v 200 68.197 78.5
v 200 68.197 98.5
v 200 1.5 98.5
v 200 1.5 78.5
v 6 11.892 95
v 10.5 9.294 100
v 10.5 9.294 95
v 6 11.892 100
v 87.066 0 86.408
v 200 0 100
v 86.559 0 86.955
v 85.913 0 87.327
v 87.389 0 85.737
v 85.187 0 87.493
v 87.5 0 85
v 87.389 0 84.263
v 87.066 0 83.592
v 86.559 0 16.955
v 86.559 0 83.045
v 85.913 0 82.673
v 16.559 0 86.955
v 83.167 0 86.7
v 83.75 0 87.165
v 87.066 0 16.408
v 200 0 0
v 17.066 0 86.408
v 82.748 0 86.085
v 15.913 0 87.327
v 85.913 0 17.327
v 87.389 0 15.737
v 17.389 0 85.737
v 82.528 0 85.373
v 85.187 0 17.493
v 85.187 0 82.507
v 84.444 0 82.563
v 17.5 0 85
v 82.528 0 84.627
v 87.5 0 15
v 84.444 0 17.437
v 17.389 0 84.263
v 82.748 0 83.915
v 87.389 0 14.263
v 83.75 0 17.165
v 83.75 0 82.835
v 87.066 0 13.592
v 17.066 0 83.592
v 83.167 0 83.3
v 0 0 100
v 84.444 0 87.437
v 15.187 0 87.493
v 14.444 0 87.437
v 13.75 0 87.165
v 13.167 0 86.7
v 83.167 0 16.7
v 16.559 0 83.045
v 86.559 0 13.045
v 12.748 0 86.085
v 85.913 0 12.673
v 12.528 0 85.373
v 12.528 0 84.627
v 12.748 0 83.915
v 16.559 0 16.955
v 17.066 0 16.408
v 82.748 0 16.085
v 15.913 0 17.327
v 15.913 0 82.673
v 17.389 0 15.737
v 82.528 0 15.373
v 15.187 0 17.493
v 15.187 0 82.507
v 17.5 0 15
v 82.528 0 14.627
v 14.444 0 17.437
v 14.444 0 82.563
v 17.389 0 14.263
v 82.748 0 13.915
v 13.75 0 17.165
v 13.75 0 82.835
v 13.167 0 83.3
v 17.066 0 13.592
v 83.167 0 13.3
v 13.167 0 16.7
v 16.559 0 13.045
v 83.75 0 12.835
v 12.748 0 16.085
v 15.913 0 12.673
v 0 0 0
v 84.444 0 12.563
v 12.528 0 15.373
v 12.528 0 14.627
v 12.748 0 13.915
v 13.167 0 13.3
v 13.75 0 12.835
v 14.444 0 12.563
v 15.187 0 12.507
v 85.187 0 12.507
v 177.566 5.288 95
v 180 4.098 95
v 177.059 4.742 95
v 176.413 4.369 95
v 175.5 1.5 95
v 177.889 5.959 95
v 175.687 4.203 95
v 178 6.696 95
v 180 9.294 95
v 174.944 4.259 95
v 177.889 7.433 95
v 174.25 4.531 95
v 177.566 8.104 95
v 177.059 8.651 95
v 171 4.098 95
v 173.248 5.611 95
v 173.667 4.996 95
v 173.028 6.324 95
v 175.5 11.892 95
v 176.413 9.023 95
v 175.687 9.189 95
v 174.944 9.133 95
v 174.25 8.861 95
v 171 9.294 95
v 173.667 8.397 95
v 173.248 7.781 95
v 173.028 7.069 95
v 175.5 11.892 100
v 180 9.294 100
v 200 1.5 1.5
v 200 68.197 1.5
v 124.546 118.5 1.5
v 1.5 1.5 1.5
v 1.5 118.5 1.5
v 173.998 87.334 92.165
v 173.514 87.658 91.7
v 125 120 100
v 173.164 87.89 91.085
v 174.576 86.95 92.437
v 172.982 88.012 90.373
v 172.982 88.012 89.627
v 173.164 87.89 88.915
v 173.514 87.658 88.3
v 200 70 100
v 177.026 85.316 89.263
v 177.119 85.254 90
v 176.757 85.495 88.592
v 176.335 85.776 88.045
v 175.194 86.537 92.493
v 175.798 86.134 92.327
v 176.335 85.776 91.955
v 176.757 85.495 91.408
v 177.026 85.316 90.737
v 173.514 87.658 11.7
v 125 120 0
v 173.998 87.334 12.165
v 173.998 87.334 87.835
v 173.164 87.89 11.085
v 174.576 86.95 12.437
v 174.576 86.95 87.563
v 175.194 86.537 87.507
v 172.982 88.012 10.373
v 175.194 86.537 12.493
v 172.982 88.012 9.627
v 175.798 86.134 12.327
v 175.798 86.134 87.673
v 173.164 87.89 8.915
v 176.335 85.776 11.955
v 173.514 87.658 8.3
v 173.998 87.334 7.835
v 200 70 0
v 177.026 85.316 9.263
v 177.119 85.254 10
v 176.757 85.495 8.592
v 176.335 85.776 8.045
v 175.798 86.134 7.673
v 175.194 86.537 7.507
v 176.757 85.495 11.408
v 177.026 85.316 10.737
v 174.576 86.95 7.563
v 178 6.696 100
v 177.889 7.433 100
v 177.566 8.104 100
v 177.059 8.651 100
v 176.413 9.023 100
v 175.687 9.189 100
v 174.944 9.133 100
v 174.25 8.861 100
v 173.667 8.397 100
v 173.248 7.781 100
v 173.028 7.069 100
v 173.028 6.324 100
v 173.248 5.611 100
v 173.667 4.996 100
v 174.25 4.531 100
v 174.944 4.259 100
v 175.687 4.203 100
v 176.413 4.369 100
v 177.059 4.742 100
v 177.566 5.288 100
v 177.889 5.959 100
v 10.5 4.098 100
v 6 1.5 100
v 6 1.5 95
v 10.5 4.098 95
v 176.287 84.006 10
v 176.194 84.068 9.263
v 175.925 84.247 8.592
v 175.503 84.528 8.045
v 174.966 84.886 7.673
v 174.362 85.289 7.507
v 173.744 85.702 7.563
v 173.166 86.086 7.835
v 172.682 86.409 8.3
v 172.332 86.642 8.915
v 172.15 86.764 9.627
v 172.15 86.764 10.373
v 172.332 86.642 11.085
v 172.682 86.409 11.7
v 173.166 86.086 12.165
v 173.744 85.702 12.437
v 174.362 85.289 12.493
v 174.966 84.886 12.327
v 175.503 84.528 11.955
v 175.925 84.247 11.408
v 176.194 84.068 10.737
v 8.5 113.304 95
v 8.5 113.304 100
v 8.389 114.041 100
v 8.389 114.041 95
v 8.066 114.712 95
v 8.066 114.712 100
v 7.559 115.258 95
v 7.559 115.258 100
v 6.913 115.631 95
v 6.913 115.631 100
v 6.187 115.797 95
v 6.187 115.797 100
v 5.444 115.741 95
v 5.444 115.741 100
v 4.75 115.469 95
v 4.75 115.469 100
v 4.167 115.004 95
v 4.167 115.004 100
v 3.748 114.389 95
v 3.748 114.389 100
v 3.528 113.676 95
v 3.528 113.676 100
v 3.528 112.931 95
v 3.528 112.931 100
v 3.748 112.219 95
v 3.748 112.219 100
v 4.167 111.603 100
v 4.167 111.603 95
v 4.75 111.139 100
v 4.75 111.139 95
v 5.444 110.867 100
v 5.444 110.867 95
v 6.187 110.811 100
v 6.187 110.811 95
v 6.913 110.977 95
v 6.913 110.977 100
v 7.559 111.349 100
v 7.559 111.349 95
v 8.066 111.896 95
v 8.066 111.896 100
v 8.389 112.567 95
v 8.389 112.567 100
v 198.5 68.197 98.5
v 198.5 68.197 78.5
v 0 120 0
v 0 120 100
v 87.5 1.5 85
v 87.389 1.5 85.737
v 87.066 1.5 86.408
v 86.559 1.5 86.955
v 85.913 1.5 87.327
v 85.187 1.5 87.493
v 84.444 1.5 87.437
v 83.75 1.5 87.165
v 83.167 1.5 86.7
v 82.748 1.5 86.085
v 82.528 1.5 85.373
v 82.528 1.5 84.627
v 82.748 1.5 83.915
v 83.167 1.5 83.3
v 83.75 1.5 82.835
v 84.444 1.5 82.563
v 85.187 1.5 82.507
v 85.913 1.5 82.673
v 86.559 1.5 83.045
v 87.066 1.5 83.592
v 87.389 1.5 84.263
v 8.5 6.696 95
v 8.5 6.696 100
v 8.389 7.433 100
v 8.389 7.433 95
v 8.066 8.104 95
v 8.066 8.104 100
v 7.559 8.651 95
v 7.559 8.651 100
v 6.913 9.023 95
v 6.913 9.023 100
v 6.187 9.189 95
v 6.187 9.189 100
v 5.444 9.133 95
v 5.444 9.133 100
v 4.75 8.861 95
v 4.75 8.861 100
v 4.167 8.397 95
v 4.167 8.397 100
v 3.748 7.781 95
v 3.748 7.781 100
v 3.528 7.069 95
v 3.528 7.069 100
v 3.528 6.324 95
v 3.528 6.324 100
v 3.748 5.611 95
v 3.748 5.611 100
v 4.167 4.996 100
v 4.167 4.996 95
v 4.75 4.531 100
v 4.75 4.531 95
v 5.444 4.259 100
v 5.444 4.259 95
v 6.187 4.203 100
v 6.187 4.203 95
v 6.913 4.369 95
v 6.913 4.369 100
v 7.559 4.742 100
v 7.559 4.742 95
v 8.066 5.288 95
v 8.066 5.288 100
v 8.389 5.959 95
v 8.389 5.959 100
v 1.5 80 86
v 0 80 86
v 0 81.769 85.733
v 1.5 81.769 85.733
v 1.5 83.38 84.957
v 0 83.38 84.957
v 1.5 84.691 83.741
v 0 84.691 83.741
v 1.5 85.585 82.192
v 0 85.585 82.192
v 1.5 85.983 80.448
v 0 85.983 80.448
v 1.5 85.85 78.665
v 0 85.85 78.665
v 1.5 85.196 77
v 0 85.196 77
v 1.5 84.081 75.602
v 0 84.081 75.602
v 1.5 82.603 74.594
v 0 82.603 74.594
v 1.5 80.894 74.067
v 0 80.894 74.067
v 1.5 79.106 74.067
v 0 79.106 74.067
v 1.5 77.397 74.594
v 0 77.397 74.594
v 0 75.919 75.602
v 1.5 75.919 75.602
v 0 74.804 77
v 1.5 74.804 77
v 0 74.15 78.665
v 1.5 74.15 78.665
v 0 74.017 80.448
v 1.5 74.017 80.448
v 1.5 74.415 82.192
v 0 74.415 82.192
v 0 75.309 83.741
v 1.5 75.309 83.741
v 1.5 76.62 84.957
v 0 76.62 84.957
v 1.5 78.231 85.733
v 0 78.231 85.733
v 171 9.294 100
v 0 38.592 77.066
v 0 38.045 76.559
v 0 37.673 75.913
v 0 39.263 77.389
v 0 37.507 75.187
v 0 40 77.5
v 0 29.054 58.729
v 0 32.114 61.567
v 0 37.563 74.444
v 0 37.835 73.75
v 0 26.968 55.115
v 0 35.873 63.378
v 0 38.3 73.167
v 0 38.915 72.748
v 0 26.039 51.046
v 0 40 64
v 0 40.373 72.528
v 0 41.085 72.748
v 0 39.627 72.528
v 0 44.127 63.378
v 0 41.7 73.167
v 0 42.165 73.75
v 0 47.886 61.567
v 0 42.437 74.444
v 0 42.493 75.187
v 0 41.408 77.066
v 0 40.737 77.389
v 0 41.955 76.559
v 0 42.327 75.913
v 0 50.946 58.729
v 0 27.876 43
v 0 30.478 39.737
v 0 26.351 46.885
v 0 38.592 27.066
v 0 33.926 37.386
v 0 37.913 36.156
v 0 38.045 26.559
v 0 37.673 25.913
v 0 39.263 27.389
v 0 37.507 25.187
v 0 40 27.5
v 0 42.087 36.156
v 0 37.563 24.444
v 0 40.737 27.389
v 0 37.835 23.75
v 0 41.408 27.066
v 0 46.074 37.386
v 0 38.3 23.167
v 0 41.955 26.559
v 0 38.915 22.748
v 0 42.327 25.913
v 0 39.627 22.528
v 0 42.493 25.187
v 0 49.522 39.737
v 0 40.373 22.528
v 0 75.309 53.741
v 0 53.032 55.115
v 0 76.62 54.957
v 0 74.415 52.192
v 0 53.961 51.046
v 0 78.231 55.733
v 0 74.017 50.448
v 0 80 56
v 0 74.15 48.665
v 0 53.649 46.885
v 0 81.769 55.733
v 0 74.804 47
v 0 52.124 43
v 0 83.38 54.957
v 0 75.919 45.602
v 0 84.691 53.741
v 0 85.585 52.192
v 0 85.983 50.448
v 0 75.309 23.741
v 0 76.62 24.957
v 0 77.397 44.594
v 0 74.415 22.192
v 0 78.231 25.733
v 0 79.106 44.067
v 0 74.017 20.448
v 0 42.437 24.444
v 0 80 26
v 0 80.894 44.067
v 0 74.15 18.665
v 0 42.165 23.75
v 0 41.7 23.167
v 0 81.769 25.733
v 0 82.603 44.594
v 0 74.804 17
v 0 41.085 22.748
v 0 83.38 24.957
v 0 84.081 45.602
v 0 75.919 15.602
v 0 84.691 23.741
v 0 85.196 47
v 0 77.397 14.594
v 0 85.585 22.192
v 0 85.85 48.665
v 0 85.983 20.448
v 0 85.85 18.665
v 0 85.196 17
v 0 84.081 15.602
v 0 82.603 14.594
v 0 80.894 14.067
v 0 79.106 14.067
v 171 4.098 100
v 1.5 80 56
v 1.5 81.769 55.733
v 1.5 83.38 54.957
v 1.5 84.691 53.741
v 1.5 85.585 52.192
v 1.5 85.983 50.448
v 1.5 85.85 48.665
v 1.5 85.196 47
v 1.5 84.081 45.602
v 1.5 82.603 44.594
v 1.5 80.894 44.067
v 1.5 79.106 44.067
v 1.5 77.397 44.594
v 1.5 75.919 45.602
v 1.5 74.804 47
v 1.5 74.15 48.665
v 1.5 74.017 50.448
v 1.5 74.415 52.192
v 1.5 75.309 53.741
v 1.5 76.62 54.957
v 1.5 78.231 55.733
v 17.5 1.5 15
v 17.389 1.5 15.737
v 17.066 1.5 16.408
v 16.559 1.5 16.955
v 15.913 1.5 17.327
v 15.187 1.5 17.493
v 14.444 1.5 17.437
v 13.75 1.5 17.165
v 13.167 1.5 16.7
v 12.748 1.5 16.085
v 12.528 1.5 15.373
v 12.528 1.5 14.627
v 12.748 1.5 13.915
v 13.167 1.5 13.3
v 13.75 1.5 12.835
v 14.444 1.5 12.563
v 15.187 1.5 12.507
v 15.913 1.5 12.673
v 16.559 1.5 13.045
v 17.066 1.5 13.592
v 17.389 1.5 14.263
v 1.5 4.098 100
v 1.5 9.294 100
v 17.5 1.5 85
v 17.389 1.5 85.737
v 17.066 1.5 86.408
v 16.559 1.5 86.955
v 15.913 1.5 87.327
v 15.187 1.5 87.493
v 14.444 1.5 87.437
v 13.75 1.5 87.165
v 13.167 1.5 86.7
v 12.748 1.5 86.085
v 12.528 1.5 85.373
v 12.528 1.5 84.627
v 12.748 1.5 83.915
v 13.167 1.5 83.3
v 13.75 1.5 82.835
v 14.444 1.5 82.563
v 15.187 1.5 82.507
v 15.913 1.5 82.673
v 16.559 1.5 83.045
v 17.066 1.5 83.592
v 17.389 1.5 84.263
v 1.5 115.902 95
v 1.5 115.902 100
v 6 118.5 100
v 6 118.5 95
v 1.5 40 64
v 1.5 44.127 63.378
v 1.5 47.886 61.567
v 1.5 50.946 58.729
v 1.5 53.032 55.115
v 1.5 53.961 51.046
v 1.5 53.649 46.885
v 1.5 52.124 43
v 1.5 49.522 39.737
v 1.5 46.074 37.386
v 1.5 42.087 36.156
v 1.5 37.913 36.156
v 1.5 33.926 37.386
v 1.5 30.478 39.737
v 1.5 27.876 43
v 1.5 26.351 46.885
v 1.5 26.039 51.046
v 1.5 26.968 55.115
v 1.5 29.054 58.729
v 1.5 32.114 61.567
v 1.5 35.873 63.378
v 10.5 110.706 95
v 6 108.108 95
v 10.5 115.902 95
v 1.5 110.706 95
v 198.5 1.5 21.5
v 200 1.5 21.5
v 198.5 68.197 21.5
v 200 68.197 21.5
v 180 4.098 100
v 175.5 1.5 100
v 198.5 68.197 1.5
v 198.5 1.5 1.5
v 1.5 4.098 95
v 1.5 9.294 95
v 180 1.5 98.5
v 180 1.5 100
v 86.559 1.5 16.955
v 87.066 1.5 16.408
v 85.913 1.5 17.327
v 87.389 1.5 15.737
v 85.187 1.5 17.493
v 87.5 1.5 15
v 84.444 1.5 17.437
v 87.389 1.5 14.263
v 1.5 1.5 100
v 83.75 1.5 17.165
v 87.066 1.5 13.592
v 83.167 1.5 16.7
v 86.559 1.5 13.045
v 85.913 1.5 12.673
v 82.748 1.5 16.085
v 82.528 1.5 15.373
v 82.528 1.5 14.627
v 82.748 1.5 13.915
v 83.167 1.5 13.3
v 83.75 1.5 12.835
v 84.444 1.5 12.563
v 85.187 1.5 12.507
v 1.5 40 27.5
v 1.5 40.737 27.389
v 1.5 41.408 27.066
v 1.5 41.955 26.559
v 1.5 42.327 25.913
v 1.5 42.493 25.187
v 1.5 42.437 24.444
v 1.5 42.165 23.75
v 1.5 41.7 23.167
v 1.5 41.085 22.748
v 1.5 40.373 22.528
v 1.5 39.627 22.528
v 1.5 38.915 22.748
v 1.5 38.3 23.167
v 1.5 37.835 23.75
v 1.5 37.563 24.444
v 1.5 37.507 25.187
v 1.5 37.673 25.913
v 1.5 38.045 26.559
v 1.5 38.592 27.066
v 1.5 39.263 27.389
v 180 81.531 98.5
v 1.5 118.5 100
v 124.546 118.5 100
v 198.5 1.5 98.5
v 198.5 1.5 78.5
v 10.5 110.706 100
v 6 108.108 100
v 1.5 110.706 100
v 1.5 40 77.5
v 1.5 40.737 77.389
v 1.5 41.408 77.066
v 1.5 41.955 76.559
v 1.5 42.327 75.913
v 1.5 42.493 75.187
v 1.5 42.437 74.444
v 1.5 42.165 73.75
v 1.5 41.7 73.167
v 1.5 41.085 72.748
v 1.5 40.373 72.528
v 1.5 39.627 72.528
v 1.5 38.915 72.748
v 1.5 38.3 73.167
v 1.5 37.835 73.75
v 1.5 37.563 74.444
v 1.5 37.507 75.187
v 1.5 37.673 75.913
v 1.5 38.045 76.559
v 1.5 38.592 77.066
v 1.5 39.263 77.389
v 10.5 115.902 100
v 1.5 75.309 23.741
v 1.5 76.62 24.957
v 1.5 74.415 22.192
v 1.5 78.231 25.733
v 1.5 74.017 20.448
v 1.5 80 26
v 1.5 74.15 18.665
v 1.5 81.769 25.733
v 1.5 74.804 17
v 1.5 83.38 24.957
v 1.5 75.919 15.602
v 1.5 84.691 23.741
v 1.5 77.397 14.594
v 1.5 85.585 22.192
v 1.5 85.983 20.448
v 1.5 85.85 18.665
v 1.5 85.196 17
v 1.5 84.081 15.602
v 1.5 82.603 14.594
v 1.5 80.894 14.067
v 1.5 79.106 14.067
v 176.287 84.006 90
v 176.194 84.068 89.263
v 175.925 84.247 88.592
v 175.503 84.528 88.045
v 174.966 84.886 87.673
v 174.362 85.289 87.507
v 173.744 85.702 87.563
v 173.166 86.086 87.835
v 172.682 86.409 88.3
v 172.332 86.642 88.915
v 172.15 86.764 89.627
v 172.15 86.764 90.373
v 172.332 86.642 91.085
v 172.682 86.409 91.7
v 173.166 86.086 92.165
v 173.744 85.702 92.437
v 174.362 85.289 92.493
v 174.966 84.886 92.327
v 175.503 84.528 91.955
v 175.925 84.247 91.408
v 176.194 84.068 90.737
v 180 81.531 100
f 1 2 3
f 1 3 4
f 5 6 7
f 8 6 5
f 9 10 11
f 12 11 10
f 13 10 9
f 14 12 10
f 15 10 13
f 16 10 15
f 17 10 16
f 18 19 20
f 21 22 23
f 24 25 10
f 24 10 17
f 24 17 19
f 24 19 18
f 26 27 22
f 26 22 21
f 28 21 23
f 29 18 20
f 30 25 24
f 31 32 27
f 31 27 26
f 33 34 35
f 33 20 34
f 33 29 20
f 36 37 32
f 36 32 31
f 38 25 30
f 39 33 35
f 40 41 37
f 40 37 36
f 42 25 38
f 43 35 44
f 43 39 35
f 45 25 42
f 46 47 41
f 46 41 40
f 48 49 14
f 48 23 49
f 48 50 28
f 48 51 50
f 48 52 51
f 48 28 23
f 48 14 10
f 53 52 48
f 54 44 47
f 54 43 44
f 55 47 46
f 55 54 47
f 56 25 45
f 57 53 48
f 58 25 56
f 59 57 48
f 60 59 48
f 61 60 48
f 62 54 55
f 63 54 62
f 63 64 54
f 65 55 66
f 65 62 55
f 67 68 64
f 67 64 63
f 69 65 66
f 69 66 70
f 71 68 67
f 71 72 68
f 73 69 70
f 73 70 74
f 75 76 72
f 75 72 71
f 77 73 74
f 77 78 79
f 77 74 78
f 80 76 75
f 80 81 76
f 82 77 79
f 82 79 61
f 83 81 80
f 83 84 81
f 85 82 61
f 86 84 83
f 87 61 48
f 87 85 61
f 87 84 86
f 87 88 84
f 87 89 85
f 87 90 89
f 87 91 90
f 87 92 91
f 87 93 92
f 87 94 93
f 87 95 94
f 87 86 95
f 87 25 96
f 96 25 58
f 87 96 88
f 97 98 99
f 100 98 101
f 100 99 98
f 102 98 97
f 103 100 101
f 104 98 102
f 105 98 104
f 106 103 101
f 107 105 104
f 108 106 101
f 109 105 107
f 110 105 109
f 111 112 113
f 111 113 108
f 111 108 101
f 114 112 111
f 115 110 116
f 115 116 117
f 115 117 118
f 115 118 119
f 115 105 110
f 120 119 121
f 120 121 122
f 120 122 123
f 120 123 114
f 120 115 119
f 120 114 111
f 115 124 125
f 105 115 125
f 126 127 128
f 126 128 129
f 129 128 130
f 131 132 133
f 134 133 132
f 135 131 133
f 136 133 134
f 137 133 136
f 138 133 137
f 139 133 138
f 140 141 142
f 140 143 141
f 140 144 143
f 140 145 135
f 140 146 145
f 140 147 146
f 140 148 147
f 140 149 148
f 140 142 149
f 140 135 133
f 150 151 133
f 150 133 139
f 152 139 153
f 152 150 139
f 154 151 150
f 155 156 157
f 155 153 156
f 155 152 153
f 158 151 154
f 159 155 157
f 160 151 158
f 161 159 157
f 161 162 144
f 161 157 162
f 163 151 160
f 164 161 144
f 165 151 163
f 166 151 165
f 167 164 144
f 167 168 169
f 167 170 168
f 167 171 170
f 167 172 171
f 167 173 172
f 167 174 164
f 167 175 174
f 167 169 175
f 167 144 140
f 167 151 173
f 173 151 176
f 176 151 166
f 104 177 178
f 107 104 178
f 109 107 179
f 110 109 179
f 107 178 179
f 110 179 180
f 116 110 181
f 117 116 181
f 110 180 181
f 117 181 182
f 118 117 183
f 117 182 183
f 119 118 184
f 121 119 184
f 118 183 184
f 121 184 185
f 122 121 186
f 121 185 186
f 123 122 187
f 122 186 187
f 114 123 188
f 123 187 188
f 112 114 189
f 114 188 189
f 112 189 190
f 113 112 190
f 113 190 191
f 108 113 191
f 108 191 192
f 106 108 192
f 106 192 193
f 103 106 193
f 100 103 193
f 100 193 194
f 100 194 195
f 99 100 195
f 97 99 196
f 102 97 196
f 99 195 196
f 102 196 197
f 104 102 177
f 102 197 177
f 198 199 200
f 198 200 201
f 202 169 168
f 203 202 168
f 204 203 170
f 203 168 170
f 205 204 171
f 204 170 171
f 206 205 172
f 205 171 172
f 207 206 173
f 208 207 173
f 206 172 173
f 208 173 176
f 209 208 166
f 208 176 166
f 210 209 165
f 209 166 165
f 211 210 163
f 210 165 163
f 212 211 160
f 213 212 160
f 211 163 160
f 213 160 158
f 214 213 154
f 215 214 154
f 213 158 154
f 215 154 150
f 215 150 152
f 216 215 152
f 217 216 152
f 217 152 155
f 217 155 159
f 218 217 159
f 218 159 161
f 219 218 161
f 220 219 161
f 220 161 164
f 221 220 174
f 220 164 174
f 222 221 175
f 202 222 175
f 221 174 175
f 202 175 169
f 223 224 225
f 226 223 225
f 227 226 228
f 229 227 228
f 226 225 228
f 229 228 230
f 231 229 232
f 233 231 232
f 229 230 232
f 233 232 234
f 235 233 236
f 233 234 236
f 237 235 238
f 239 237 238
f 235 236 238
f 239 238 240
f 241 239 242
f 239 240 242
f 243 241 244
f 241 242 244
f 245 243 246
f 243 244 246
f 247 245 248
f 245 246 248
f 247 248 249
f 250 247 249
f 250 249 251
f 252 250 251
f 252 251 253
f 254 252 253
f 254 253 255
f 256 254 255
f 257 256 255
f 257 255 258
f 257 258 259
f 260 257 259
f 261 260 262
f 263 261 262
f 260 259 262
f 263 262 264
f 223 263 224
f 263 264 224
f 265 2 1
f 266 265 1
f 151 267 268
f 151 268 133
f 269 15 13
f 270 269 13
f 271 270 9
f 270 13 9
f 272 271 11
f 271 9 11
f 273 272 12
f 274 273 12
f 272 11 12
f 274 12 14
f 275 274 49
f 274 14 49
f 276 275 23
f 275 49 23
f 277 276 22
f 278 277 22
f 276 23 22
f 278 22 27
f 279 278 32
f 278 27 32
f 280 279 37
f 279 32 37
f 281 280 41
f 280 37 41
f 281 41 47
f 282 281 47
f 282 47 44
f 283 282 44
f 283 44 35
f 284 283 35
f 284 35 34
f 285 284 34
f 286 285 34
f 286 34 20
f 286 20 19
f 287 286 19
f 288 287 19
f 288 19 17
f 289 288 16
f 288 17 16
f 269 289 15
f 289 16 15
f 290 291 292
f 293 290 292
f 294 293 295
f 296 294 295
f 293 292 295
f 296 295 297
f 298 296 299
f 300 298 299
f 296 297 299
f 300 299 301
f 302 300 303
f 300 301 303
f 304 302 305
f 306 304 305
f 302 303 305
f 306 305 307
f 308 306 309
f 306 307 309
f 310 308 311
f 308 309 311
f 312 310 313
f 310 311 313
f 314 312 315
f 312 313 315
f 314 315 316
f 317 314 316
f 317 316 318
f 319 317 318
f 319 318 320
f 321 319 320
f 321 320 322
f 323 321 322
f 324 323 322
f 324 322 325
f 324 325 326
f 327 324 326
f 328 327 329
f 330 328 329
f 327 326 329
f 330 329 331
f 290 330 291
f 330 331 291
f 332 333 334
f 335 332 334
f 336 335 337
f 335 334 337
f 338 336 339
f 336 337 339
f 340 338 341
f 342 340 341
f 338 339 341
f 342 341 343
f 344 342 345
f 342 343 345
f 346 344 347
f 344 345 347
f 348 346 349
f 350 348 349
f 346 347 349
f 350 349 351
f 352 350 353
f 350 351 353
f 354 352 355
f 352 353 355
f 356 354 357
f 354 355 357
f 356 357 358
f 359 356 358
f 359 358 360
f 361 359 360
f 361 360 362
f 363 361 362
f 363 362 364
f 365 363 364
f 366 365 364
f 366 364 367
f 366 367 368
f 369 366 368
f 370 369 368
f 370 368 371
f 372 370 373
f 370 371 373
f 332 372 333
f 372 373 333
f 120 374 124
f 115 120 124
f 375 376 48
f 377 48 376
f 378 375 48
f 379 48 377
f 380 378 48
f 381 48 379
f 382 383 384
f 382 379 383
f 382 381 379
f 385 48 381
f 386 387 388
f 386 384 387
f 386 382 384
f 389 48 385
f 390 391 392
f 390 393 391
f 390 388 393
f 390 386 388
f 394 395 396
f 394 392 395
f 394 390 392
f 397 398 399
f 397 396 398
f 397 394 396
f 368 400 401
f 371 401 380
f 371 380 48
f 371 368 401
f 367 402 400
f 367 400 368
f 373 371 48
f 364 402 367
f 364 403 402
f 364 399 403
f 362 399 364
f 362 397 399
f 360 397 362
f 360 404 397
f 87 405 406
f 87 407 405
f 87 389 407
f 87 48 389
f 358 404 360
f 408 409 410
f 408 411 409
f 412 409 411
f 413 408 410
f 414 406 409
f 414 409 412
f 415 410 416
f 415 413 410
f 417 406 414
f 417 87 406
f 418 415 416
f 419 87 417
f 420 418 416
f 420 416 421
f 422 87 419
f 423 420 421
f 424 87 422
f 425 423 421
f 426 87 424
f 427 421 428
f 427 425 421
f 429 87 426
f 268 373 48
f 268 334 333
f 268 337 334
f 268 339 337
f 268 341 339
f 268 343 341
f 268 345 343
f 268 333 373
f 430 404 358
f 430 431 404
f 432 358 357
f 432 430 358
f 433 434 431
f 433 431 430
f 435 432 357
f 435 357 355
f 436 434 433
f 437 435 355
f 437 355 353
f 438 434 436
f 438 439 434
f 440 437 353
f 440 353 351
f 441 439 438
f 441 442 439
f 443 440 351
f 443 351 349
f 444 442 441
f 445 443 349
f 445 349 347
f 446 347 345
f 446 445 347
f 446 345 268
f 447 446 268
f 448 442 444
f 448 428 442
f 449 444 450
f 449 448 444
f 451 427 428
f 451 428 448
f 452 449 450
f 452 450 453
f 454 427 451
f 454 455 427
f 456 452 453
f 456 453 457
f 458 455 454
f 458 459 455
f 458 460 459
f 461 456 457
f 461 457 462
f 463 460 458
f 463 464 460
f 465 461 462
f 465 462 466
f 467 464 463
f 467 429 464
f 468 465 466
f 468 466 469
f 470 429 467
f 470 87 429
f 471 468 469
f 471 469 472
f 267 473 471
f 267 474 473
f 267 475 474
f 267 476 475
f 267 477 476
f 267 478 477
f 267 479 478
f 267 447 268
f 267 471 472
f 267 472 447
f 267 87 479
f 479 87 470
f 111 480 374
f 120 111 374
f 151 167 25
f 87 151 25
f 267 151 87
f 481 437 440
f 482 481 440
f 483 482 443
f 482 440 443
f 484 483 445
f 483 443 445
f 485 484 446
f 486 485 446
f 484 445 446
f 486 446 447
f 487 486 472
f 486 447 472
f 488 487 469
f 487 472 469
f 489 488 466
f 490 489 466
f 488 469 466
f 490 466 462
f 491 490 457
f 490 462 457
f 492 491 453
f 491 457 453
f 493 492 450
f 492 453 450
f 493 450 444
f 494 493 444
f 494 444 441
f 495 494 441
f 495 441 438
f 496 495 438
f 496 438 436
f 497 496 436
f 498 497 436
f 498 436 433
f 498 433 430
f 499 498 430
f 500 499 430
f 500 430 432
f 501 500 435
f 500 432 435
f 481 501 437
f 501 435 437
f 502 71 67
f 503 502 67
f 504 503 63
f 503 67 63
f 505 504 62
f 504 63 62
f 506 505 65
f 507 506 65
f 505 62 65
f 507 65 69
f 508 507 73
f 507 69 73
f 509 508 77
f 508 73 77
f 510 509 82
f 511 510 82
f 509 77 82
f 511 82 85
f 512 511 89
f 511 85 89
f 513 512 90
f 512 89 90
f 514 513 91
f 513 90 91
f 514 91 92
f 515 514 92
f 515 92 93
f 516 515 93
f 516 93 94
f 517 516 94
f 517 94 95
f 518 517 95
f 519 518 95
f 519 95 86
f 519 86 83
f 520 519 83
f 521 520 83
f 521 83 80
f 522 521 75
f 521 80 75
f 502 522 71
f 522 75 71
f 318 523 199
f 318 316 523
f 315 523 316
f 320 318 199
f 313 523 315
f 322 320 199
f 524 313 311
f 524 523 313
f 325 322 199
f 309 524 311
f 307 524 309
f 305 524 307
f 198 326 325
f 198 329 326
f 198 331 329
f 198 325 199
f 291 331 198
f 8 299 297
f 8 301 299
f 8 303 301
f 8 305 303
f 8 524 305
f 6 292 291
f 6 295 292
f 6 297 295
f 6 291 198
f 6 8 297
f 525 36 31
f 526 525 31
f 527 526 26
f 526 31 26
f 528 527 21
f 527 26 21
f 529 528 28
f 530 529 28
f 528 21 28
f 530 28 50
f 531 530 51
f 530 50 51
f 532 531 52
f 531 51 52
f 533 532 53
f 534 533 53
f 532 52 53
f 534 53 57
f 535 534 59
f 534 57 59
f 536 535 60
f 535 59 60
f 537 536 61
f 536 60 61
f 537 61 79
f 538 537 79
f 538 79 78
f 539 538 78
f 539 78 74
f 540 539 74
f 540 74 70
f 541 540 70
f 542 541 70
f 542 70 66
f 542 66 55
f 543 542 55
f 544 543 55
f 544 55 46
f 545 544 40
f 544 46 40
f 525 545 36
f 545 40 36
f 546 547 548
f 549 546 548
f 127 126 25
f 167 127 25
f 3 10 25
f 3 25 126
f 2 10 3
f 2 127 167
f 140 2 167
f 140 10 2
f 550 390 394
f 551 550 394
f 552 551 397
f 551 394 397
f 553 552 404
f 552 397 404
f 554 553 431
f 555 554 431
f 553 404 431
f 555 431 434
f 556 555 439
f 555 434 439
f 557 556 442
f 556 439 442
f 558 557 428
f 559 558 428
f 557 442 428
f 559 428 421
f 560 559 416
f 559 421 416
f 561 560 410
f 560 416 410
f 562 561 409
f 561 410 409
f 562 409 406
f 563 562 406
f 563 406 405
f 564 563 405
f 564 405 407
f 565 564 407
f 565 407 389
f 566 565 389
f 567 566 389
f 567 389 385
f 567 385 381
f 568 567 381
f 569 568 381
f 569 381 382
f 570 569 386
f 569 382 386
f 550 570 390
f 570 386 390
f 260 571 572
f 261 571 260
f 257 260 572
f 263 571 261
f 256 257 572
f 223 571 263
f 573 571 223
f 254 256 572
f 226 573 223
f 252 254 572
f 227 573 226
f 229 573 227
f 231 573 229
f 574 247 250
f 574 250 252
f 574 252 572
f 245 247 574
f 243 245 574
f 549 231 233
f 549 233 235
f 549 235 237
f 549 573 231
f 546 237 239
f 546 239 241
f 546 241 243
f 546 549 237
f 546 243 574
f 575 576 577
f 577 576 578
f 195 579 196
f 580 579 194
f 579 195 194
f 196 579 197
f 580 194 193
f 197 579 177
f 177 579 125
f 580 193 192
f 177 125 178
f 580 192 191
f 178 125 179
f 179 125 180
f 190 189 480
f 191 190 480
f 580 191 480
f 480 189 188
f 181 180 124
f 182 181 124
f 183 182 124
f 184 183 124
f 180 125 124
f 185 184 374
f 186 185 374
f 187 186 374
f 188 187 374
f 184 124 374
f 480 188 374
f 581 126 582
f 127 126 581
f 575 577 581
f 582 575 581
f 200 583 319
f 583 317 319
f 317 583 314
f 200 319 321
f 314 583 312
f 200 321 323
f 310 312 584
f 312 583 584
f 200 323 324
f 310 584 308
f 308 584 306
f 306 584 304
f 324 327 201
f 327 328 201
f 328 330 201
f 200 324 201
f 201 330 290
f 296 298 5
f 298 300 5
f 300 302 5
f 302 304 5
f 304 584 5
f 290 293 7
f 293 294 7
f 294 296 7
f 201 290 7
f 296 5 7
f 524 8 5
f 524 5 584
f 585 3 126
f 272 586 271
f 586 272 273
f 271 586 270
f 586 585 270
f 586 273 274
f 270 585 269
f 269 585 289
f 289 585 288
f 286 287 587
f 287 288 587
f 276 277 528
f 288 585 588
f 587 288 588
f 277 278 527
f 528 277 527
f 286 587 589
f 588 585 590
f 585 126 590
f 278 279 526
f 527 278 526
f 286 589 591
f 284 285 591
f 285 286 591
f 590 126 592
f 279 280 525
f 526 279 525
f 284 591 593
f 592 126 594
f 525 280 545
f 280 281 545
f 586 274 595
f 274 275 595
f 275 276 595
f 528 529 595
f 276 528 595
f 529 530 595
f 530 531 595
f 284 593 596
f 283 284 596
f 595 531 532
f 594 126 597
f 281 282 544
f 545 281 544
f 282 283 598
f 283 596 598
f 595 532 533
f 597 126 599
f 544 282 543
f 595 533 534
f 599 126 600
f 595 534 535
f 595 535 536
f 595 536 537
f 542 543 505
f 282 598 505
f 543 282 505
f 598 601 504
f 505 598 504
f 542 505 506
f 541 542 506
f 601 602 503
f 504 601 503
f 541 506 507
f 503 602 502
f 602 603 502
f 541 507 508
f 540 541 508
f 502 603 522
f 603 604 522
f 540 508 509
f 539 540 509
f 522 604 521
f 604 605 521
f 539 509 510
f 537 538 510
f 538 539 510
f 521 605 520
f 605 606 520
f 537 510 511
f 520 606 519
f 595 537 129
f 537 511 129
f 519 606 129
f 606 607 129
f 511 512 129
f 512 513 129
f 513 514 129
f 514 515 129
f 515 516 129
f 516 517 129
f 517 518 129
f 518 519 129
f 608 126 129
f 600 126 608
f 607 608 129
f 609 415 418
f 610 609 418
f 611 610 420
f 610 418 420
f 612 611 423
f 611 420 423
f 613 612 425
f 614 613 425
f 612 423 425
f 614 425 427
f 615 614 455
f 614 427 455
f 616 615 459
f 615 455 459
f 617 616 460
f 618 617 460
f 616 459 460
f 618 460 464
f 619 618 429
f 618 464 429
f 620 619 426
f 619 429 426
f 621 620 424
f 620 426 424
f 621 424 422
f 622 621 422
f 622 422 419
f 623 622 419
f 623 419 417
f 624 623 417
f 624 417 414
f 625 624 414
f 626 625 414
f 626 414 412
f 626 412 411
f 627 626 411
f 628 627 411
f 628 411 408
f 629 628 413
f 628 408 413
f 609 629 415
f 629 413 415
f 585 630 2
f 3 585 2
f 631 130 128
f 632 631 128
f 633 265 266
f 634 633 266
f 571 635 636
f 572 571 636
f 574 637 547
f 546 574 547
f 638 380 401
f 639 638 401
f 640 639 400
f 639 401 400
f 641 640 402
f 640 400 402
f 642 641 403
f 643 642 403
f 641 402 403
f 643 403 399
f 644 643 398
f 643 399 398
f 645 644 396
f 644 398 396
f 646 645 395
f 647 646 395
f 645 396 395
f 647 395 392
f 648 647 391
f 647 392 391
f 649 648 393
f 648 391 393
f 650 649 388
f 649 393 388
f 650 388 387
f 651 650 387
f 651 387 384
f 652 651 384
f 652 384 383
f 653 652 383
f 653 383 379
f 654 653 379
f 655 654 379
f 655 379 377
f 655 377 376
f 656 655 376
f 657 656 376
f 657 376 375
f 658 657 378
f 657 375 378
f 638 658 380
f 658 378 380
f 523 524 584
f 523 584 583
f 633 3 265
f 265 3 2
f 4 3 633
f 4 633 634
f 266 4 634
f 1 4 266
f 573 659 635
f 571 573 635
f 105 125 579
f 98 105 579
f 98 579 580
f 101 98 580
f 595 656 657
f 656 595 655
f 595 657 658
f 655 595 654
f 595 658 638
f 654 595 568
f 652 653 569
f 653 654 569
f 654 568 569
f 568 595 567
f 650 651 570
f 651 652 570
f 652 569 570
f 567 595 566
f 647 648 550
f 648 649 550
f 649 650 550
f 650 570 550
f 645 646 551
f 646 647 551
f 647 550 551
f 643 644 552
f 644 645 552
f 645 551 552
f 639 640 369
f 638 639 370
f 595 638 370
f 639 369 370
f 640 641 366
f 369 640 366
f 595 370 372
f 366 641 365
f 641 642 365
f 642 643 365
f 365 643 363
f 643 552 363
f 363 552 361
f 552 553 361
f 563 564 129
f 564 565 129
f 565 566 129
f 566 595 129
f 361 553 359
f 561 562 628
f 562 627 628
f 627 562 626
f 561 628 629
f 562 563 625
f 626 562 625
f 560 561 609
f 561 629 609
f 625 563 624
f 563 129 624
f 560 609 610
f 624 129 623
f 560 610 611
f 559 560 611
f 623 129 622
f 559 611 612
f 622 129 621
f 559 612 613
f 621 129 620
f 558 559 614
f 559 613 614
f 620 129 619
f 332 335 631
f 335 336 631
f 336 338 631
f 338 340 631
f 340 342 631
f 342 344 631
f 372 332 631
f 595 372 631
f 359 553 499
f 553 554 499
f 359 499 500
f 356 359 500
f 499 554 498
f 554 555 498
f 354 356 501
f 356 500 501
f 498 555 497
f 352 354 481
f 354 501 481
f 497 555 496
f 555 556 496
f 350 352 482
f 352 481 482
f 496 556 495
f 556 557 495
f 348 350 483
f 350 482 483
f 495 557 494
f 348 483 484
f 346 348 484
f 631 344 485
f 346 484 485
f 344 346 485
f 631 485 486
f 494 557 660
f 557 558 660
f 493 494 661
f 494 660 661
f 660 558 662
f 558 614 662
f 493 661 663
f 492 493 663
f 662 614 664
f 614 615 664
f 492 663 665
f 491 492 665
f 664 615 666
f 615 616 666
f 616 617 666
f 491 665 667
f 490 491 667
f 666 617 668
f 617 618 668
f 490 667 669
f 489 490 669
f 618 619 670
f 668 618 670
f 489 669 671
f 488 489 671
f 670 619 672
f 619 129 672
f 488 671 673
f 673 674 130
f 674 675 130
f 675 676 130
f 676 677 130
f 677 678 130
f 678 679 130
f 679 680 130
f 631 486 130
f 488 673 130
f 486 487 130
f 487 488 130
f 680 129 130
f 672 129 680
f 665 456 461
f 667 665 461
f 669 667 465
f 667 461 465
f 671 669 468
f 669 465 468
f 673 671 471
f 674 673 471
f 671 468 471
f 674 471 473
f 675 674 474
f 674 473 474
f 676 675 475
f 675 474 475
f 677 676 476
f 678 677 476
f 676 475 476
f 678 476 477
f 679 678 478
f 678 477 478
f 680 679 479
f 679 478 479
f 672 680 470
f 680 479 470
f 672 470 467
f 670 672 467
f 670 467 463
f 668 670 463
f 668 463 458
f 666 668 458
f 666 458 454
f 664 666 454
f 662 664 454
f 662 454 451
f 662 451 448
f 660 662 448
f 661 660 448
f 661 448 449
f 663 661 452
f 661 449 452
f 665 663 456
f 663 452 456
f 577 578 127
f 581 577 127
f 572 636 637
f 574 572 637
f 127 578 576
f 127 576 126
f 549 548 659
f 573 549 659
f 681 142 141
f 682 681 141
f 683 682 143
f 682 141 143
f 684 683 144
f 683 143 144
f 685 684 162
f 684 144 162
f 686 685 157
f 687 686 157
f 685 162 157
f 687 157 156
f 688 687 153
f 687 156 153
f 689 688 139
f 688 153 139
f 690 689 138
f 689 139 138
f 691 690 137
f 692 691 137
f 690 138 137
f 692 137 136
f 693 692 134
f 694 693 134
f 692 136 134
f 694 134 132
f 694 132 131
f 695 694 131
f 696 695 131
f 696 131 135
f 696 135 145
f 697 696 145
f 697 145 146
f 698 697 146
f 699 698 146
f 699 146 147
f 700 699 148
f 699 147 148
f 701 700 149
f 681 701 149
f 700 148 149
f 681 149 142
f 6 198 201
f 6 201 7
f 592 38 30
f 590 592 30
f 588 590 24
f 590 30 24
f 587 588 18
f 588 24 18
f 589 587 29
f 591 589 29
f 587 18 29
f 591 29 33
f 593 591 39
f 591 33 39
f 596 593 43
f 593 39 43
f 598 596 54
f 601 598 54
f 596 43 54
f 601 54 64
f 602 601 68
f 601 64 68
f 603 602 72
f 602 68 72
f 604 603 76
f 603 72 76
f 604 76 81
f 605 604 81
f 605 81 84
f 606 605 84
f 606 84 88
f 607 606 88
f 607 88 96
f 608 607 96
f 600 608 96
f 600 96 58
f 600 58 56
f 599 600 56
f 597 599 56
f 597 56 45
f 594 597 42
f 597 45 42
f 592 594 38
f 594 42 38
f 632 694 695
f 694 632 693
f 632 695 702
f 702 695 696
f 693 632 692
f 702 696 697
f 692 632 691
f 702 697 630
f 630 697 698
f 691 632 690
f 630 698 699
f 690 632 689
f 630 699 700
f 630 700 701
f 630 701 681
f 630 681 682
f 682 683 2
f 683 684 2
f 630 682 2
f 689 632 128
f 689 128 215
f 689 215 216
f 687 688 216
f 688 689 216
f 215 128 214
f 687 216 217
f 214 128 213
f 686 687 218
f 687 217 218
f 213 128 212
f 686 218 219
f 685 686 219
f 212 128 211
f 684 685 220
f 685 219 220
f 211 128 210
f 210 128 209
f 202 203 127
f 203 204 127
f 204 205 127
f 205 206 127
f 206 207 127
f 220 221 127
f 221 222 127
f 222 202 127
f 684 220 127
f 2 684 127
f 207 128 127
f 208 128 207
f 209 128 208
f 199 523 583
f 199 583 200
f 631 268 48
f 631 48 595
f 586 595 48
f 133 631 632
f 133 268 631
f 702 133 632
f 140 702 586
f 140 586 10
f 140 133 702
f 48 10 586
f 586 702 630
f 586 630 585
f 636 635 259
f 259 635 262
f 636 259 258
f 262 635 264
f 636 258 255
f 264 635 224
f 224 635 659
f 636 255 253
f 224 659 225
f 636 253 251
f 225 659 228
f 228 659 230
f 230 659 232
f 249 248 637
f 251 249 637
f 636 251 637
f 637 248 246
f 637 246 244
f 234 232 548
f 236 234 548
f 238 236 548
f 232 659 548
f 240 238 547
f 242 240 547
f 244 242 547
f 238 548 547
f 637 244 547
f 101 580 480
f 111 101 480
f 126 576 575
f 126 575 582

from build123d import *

# Parameters (mm, degrees)
BOSS_EXTRUDE1_DEPTH   = 100
SHELL1_T              = -1.5
BOSS_EXTRUDE2_DEPTH   = 1.5
SKETCH3_W             = 20
SKETCH3_H             = 66.697224362
BOSS_EXTRUDE7_DEPTH   = 1.5
BOSS_EXTRUDE7_2_DEPTH = 1.5
SKETCH4_R             = 14
SKETCH4_R_2           = 6
SKETCH4_R_3           = 2.5
CUT_EXTRUDE1_DEPTH    = 1.5
SKETCH5_R             = 2.5
CUT_EXTRUDE2_DEPTH    = 1.5
SKETCH6_R             = 2.5
BOSS_EXTRUDE8_DEPTH   = 5
BOSS_EXTRUDE8_2_DEPTH = 5
BOSS_EXTRUDE8_3_DEPTH = 5
SKETCH8_R             = 2.5
CUT_EXTRUDE3_DEPTH    = 1.5


with BuildPart() as part:
    # Sketch1 → Boss-Extrude1 (new body)
    with BuildSketch(Plane.XY):
        Polygon((0, 0), (0, 120), (125, 120), (200, 70), (200, 0), align=None)
    extrude(amount=BOSS_EXTRUDE1_DEPTH)

    # Shell1
    shell1_openings = [part.faces().sort_by_distance(p)[0] for p in [
        (105, 62, 100),
        (200, 35, 50),
    ]]
    offset(amount=SHELL1_T, openings=shell1_openings, kind=Kind.INTERSECTION)

    # Sketch2 → Boss-Extrude2 (add)
    with BuildSketch(Plane.XY.offset(100)):
        Polygon((200, 1.5), (200, 68.197224362), (180, 81.530557696), (180, 1.5), align=None)
    extrude(amount=-BOSS_EXTRUDE2_DEPTH)

    # Sketch4 → Cut-Extrude1 (cut)
    with BuildSketch(Plane.ZY):
        with Locations((50, 40)):
            Circle(SKETCH4_R)
        with Locations((20, 80)):
            Circle(SKETCH4_R_2)
        with Locations((80, 80)):
            Circle(SKETCH4_R_2)
        with Locations((25, 40)):
            Circle(SKETCH4_R_3)
        with Locations((75, 40)):
            Circle(SKETCH4_R_3)
        with Locations((50, 80)):
            Circle(SKETCH4_R_2)
    extrude(amount=-CUT_EXTRUDE1_DEPTH, mode=Mode.SUBTRACT)

    # Sketch5 → Cut-Extrude2 (cut)
    with BuildSketch(Plane(origin=(93.846153846, 140.769230769, 0), x_dir=(0.832050294, -0.554700196, 0), z_dir=(0.554700196, 0.832050294, 0))):
        with Locations((97.581045132, -10)):
            Circle(SKETCH5_R)
        with Locations((97.581045132, -90)):
            Circle(SKETCH5_R)
    extrude(amount=-CUT_EXTRUDE2_DEPTH, mode=Mode.SUBTRACT)

    # Sketch8 → Cut-Extrude3 (cut)
    with BuildSketch(Plane.XZ):
        with Locations((15, 85)):
            Circle(SKETCH8_R)
        with Locations((85, 85)):
            Circle(SKETCH8_R)
        with Locations((15, 15)):
            Circle(SKETCH8_R)
        with Locations((85, 15)):
            Circle(SKETCH8_R)
    extrude(amount=-CUT_EXTRUDE3_DEPTH, mode=Mode.SUBTRACT)


with BuildPart() as body_2:
    # Sketch3 → Boss-Extrude7 (new body)
    with BuildSketch(Plane(origin=(200, 0, 0), x_dir=(0, 0, -1), z_dir=(1, 0, 0))):
        with Locations((-11.5, 34.848612181)):
            Rectangle(SKETCH3_W, SKETCH3_H)
    extrude(amount=-BOSS_EXTRUDE7_DEPTH)


with BuildPart() as body_3:
    # Sketch3 → Boss-Extrude7 2 (new body)
    with BuildSketch(Plane(origin=(200, 0, 0), x_dir=(0, 0, -1), z_dir=(1, 0, 0))):
        with Locations((-88.5, 34.848612181)):
            Rectangle(SKETCH3_W, SKETCH3_H)
    extrude(amount=-BOSS_EXTRUDE7_2_DEPTH)


with BuildPart() as body_4:
    # Sketch6 → Boss-Extrude8 (new body)
    with BuildSketch(Plane.XY.offset(100)):
        Polygon((6, 1.5), (10.5, 4.098076211), (10.5, 9.294228634), (6, 11.892304845), (1.5, 9.294228634), (1.5, 4.098076211), align=None)
        with Locations((6, 6.696152423)):
            Circle(SKETCH6_R, mode=Mode.SUBTRACT)
    extrude(amount=-BOSS_EXTRUDE8_DEPTH)


with BuildPart() as body_5:
    # Sketch6 → Boss-Extrude8 2 (new body)
    with BuildSketch(Plane.XY.offset(100)):
        Polygon((10.5, 115.901923789), (10.5, 110.705771366), (6, 108.107695155), (1.5, 110.705771366), (1.5, 115.901923789), (6, 118.5), align=None)
        with Locations((6, 113.303847577)):
            Circle(SKETCH6_R, mode=Mode.SUBTRACT)
    extrude(amount=-BOSS_EXTRUDE8_2_DEPTH)


with BuildPart() as body_6:
    # Sketch6 → Boss-Extrude8 3 (new body)
    with BuildSketch(Plane.XY.offset(100)):
        Polygon((180, 4.098076211), (175.5, 1.5), (171, 4.098076211), (171, 9.294228634), (175.5, 11.892304845), (180, 9.294228634), align=None)
        with Locations((175.5, 6.696152423)):
            Circle(SKETCH6_R, mode=Mode.SUBTRACT)
    extrude(amount=-BOSS_EXTRUDE8_3_DEPTH)


solid = Compound([part.part, body_2.part, body_3.part, body_4.part, body_5.part, body_6.part])
